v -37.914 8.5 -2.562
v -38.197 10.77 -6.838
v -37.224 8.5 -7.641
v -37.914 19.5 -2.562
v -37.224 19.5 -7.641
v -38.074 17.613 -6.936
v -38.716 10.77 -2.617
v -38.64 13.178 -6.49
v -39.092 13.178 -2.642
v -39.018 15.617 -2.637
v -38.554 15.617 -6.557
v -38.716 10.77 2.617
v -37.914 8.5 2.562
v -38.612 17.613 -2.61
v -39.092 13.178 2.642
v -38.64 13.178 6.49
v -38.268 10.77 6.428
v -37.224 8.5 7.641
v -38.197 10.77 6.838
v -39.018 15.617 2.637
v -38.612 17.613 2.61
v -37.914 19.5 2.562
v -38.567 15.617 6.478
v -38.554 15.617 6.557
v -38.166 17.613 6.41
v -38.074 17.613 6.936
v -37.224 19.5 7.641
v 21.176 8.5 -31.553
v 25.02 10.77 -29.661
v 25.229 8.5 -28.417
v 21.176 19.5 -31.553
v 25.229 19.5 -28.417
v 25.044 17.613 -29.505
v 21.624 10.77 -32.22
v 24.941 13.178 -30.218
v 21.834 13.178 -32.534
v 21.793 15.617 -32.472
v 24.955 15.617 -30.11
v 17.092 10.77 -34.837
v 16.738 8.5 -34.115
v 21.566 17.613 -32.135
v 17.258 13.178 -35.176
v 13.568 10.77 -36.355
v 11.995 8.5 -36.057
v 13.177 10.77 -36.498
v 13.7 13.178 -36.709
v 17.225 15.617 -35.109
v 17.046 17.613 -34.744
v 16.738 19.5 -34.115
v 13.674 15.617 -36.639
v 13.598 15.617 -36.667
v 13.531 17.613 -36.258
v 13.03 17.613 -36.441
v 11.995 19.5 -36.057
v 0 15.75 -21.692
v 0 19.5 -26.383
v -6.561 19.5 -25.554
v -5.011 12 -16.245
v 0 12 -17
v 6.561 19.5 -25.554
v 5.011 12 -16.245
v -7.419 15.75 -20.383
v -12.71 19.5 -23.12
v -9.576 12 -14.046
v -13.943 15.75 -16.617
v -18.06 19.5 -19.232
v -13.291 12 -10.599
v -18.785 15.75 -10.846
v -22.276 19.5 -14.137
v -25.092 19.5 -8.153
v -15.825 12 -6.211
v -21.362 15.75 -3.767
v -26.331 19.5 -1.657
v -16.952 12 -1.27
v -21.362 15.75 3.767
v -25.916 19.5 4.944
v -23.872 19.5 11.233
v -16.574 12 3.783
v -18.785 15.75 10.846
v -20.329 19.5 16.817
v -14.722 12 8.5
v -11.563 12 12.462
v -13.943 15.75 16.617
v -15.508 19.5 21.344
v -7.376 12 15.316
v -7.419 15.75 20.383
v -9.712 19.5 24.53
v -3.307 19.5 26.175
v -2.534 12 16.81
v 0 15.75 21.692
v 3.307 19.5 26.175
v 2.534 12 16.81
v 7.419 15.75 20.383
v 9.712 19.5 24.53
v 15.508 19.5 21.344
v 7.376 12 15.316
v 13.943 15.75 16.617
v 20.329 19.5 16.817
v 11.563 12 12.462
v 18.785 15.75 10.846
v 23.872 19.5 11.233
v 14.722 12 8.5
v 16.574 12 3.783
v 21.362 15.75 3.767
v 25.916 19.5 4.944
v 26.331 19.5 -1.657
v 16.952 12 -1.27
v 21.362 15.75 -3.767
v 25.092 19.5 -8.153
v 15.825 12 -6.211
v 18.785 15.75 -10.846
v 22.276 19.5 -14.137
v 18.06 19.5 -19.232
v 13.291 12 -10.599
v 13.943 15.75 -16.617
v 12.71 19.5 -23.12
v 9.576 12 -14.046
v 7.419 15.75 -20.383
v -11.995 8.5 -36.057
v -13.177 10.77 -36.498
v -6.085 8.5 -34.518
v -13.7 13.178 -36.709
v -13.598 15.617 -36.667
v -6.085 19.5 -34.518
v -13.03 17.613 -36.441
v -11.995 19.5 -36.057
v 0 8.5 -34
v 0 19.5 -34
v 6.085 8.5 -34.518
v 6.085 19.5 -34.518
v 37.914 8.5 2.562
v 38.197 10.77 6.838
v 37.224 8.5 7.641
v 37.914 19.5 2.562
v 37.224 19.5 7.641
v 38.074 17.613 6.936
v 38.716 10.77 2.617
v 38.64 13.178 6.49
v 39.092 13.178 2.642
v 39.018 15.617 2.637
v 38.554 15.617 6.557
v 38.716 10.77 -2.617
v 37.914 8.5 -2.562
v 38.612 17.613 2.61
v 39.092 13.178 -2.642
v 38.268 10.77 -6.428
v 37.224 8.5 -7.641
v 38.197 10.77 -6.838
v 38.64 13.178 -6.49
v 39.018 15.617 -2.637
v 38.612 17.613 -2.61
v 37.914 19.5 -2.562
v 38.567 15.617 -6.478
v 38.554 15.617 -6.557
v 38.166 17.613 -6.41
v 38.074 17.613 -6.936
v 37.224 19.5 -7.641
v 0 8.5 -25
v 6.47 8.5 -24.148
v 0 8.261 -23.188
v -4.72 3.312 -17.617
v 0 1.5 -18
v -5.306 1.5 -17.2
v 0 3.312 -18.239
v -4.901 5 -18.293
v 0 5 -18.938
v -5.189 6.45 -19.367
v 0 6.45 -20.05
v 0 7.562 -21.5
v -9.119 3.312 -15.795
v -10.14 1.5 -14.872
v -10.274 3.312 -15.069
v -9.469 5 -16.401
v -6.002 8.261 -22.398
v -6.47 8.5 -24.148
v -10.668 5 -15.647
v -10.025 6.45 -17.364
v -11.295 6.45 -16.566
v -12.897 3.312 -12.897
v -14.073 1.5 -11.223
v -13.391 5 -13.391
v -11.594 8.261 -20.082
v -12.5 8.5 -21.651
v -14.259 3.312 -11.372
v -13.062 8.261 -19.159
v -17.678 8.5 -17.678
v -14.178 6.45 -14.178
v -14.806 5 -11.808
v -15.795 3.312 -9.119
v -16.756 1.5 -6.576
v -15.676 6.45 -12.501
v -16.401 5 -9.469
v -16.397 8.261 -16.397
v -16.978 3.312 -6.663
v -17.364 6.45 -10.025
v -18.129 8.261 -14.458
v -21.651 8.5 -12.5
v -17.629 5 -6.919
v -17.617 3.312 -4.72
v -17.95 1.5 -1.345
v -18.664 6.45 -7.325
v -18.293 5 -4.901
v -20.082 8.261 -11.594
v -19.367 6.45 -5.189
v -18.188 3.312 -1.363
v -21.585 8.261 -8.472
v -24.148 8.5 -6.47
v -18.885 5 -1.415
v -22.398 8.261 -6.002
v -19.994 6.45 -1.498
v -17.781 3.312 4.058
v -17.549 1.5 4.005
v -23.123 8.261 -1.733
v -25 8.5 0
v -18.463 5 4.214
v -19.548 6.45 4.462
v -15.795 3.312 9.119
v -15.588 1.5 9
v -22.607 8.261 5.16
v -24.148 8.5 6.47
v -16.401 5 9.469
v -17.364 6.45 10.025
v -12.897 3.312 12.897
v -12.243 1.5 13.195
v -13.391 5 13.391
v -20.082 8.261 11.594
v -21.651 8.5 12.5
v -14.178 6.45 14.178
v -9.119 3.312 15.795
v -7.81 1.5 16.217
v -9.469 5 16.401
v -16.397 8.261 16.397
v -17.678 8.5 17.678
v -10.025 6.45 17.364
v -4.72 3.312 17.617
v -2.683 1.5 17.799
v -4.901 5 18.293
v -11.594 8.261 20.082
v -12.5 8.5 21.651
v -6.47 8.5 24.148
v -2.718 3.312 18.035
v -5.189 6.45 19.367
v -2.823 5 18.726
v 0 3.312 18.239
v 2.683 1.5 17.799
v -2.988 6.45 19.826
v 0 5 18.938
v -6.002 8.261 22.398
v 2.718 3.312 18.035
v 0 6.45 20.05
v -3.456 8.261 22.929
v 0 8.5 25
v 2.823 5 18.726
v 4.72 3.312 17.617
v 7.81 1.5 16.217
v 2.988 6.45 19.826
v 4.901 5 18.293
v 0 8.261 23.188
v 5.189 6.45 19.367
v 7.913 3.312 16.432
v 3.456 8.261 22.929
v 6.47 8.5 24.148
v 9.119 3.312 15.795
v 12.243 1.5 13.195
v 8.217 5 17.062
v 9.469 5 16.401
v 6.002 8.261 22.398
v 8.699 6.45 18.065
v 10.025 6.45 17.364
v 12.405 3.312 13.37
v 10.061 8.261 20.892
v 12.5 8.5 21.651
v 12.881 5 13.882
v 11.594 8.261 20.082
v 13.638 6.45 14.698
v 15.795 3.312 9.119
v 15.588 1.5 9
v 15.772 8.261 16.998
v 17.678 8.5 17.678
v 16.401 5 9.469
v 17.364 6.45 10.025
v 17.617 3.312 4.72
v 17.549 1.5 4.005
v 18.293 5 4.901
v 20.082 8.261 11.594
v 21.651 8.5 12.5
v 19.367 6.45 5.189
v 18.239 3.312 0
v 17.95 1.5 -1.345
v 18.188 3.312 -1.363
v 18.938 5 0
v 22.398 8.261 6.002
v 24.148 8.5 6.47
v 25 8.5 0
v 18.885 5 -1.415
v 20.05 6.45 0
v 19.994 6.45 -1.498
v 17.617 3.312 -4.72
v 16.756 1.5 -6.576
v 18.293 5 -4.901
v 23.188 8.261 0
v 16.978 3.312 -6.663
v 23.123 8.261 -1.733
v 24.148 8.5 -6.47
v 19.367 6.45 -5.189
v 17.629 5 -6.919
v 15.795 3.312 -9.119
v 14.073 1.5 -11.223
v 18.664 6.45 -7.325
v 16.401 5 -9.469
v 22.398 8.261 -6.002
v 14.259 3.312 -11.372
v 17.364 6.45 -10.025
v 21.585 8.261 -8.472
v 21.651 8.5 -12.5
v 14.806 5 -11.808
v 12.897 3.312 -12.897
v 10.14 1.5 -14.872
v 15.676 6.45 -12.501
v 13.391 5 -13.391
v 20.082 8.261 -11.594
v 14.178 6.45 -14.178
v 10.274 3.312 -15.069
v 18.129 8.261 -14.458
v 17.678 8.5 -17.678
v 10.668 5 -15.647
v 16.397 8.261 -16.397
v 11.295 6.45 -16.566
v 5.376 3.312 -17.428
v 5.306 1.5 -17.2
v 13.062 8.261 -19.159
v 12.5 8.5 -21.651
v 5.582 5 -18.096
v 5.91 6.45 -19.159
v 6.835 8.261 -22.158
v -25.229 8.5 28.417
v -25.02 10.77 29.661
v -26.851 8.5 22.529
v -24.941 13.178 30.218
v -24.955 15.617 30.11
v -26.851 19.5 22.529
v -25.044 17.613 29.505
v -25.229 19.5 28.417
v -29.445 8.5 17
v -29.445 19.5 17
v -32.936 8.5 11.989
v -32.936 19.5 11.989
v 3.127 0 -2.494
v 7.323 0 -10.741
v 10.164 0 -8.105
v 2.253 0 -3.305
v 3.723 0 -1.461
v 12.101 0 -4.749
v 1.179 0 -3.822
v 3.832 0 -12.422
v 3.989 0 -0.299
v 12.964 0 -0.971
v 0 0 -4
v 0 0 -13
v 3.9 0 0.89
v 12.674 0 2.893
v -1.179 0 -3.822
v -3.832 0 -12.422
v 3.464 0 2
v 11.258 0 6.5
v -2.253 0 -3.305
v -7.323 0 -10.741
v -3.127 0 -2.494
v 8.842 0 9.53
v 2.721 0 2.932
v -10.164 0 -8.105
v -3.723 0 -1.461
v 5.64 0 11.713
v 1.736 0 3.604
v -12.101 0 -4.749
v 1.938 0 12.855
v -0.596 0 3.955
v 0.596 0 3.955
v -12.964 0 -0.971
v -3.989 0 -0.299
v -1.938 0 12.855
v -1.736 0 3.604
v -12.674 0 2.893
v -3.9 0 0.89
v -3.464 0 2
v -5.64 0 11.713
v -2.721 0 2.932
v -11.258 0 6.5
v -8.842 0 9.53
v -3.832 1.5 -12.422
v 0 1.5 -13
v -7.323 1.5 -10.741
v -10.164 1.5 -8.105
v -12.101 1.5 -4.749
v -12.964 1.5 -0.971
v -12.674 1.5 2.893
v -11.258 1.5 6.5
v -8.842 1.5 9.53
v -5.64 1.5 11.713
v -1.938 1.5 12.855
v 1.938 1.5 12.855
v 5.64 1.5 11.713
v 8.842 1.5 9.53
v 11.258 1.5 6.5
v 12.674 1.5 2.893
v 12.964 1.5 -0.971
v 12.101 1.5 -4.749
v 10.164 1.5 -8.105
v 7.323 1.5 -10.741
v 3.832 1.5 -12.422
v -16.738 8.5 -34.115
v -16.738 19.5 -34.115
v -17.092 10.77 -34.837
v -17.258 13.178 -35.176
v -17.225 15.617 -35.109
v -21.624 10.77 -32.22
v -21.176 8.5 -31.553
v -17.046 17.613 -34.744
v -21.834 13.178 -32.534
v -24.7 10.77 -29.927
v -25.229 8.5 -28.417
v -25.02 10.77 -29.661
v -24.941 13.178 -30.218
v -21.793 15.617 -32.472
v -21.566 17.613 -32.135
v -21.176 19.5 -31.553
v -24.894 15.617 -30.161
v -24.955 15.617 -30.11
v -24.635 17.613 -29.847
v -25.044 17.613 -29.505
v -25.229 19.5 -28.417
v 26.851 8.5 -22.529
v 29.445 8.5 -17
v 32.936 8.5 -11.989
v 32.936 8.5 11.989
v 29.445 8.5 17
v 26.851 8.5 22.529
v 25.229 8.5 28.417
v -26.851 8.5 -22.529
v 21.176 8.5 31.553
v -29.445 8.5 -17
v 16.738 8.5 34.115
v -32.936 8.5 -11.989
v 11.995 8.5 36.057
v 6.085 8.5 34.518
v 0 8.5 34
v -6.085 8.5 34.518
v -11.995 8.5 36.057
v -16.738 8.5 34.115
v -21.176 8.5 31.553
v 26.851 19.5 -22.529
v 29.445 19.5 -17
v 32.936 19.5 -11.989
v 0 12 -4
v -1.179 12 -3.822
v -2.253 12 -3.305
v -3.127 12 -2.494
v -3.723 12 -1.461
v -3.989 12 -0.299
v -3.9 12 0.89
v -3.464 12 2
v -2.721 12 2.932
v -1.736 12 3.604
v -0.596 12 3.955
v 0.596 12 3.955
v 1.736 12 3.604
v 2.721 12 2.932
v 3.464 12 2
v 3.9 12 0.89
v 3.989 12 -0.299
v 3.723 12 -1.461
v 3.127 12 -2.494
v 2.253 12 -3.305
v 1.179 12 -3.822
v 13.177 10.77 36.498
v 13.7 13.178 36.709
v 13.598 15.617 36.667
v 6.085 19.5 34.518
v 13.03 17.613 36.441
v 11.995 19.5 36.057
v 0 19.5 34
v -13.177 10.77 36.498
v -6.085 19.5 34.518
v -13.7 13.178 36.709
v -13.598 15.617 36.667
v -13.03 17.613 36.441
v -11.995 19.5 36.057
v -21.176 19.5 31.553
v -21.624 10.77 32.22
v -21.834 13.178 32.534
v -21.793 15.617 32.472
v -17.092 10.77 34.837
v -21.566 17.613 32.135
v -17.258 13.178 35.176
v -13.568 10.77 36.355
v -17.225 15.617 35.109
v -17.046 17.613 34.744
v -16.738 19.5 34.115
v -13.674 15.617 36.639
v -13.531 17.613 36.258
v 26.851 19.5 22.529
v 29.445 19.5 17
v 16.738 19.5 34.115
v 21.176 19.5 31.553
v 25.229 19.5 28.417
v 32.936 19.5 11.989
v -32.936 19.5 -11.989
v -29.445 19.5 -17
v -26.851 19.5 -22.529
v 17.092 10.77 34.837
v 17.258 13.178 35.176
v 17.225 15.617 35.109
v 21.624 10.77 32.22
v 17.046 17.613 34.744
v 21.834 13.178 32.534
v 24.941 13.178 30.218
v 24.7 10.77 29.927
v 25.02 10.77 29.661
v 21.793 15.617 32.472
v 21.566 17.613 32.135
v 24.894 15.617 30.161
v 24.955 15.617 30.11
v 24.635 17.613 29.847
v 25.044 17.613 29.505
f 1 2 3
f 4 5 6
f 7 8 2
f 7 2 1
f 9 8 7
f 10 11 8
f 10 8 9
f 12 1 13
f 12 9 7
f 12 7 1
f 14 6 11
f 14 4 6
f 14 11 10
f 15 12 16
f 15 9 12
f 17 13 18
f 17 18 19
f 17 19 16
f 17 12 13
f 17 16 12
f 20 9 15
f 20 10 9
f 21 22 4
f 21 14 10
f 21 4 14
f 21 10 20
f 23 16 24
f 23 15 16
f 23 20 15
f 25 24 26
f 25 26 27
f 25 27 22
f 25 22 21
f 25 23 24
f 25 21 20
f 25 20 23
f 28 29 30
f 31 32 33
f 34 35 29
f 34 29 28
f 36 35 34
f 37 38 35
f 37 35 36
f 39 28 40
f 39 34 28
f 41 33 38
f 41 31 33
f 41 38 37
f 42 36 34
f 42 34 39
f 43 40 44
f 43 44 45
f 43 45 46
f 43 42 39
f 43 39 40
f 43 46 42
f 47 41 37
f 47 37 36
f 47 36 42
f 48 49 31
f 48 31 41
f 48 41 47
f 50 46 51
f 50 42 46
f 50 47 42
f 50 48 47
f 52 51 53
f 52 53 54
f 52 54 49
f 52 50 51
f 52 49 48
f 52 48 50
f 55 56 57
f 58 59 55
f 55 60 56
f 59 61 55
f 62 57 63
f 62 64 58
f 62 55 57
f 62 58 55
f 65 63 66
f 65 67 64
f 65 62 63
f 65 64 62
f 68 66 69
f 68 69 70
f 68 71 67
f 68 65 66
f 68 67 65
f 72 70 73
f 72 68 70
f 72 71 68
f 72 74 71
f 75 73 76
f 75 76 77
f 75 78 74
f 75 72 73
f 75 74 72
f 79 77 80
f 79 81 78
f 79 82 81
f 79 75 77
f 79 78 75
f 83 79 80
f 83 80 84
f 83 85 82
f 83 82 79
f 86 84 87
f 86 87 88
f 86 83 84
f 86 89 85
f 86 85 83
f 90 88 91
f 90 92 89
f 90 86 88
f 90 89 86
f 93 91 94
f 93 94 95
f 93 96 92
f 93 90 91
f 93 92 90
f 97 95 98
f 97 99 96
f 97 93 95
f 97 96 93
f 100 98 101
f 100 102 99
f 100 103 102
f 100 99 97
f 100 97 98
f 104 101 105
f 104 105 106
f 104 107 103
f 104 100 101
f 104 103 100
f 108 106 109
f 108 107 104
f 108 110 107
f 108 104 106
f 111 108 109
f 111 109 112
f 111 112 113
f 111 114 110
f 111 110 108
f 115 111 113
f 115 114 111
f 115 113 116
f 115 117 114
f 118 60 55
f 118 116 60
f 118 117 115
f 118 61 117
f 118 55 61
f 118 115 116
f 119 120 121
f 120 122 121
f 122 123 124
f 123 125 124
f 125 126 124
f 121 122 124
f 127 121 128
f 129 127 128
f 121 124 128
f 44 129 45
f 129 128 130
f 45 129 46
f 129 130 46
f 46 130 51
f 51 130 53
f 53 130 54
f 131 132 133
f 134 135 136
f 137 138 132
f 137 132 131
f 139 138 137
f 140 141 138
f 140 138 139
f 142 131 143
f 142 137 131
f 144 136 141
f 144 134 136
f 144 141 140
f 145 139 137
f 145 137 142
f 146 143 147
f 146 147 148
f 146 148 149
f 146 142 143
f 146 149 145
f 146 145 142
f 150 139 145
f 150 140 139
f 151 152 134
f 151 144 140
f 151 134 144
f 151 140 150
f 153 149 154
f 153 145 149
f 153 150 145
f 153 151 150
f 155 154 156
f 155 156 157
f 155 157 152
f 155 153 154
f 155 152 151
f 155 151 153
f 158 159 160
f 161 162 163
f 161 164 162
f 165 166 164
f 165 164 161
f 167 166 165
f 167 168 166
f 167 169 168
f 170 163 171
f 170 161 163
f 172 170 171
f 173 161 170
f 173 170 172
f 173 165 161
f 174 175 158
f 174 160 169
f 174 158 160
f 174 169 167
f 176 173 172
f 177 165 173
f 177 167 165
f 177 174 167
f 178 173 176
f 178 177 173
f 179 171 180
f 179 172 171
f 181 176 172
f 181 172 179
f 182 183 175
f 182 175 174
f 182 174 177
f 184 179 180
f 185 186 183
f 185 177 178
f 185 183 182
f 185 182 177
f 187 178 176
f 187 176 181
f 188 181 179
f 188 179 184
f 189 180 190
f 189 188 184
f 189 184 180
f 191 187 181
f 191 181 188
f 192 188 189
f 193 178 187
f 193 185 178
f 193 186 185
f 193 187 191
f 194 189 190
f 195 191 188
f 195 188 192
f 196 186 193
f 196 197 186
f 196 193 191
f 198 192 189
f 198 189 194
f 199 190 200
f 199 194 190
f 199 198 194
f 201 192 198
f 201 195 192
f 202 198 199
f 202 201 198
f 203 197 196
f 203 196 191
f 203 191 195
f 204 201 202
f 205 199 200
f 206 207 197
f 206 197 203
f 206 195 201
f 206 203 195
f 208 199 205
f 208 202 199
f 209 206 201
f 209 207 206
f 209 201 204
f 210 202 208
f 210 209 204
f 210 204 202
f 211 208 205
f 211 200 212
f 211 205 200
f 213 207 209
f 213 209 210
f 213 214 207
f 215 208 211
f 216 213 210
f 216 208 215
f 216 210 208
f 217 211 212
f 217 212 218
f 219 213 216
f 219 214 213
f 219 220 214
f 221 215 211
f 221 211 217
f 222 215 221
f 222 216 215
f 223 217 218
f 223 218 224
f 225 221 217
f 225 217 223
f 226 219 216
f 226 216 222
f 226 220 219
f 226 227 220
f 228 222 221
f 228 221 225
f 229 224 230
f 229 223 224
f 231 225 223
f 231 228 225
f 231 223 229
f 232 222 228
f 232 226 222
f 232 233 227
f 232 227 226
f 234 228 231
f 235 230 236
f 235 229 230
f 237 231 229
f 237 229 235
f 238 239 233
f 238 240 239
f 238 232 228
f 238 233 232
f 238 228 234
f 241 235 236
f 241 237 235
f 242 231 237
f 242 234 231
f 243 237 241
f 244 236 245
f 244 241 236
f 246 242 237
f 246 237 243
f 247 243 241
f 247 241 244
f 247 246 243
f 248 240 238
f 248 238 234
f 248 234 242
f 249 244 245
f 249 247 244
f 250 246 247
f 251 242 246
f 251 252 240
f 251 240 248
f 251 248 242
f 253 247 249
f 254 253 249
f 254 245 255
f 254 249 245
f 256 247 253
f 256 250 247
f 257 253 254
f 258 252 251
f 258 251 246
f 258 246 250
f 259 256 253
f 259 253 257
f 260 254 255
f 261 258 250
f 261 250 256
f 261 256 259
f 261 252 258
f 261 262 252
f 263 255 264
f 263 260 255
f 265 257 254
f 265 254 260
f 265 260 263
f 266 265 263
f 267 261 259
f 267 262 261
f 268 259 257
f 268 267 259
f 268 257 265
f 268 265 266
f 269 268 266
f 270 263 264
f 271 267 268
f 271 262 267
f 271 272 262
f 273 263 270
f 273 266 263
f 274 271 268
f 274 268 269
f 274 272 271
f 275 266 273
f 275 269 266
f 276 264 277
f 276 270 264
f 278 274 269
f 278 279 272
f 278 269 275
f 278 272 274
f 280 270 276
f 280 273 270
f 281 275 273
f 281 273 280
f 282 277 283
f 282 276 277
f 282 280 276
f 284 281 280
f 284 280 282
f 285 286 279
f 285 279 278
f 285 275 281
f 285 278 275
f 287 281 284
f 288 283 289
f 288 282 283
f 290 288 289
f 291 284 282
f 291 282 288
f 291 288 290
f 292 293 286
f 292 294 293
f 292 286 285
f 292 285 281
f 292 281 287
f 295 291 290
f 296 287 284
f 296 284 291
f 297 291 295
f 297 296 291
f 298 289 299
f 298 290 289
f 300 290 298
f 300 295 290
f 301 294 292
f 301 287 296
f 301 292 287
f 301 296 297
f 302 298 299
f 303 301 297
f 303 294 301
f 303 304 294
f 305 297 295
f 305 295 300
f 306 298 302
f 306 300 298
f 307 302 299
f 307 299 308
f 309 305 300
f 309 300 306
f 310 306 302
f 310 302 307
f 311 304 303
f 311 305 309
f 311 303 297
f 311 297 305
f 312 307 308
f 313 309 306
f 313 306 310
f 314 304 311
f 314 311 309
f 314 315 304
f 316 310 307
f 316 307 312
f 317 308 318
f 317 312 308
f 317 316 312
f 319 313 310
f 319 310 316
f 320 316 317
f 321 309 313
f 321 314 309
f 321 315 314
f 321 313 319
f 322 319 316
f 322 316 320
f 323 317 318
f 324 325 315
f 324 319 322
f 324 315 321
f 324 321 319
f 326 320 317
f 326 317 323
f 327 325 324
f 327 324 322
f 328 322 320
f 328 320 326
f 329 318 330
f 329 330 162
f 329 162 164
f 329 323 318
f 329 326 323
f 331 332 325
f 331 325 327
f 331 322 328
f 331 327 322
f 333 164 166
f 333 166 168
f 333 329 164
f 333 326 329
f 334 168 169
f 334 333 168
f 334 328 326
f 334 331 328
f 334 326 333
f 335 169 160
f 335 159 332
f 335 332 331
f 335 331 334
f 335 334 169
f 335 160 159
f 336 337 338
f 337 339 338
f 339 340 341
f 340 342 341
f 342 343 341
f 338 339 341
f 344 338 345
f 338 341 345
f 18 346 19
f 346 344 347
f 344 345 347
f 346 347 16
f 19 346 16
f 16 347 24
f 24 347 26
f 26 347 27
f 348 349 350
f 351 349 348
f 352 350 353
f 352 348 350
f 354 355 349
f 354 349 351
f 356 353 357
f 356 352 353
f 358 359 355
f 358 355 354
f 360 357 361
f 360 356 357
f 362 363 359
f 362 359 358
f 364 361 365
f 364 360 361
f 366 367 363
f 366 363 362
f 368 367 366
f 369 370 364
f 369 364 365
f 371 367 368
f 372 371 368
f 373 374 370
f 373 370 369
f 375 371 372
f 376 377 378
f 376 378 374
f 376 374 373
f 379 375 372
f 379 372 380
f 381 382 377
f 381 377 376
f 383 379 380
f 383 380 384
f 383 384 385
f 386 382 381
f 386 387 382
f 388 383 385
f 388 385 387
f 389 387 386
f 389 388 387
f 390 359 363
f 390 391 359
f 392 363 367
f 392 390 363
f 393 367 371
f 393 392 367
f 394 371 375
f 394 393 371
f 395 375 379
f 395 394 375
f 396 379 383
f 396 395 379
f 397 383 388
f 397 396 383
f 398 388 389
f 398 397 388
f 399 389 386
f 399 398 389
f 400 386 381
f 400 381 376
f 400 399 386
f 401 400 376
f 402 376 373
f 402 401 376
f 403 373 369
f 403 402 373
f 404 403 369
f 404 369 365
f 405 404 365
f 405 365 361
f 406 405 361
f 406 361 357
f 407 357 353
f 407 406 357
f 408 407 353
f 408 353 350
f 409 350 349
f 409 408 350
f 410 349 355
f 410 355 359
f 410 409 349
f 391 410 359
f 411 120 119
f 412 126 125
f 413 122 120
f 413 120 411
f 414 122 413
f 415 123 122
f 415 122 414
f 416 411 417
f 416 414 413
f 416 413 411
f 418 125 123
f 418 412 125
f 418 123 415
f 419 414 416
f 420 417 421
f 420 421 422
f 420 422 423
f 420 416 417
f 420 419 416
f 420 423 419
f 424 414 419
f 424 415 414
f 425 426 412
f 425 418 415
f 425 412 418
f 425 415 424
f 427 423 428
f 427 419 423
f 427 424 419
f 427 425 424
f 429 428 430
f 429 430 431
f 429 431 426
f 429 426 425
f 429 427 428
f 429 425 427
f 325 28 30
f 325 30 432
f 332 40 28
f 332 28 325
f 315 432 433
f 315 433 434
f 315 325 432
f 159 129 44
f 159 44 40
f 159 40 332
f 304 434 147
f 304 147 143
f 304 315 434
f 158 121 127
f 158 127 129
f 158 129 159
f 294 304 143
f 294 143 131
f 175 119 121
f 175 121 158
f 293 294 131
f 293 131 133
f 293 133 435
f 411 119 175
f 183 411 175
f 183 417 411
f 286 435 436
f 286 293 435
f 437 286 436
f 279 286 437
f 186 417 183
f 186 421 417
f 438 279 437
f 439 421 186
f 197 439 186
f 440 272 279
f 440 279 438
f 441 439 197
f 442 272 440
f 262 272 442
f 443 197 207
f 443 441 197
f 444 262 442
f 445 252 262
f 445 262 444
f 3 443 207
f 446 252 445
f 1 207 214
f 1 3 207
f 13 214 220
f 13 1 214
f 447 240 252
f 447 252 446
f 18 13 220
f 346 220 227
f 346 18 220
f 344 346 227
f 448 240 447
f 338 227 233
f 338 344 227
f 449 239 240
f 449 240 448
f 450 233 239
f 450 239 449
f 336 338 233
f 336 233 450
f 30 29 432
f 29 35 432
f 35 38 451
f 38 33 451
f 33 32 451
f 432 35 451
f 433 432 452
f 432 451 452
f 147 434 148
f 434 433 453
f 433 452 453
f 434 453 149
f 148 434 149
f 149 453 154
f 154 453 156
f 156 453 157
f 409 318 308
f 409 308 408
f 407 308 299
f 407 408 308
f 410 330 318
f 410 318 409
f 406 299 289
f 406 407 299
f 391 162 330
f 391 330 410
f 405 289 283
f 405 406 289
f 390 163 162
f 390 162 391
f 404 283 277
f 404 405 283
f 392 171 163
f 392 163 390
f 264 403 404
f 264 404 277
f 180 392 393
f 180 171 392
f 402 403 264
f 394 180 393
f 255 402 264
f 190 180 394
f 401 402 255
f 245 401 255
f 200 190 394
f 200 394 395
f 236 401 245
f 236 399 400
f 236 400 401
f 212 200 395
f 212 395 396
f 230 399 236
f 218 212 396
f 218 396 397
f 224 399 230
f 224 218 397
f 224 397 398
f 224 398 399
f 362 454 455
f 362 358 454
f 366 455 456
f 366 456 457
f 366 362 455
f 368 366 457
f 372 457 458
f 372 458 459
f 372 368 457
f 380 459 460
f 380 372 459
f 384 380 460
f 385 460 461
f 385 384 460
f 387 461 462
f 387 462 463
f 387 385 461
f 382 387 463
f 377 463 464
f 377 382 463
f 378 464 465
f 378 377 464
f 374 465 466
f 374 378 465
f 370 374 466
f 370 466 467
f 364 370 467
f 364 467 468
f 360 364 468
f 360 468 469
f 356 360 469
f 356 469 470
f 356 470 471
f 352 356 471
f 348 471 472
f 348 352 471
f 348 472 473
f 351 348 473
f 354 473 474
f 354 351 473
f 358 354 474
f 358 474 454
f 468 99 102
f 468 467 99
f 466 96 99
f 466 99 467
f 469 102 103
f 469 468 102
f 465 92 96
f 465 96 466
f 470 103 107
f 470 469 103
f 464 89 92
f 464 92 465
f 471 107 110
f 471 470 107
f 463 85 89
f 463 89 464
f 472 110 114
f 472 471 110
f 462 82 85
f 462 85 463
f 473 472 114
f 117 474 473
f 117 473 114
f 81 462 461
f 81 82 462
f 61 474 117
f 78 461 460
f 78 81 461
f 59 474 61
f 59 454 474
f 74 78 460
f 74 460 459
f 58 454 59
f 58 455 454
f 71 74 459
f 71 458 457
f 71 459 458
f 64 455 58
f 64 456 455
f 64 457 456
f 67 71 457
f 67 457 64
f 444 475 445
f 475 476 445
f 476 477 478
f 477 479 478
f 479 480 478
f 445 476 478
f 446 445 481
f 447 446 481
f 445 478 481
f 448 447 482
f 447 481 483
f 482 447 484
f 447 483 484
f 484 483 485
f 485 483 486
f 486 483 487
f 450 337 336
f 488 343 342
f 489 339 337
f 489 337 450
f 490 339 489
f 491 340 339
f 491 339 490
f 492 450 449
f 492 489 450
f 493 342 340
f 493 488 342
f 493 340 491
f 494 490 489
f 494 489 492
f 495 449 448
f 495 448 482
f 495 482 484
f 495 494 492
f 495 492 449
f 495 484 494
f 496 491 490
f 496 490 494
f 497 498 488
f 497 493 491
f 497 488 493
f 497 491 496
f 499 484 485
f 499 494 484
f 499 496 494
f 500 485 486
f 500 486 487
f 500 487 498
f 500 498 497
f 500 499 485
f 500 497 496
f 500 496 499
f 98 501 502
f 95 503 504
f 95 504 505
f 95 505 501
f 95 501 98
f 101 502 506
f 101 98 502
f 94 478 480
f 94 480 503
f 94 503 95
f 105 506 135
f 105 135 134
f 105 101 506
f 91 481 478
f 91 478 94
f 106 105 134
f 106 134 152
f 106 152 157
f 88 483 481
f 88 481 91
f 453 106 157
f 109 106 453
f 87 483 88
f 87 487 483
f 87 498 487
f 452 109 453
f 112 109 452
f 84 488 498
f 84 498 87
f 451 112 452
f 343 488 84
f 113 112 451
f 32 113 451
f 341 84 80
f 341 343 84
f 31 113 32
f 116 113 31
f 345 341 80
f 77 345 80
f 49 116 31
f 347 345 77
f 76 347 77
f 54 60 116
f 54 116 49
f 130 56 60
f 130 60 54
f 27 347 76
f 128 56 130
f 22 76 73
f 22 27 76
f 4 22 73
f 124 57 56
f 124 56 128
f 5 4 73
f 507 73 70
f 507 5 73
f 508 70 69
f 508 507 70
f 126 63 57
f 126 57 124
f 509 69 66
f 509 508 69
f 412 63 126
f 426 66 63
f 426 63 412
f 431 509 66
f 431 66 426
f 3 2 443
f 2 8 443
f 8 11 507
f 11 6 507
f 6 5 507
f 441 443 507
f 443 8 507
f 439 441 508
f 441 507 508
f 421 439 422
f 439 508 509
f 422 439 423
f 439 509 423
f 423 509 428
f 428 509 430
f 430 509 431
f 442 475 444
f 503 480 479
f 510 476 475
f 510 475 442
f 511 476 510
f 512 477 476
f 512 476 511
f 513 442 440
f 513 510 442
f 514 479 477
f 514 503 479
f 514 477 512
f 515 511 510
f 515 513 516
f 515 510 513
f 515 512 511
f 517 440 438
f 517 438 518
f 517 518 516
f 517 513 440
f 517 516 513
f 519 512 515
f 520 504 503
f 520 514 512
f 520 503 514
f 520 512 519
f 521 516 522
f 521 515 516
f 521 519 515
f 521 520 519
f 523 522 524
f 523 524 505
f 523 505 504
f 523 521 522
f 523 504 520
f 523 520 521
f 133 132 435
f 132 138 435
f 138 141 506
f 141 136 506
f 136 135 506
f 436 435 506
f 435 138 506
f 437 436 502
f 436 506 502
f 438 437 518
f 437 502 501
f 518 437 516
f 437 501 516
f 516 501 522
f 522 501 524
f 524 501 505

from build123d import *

# Parameters (mm, degrees)
ENL_V_MAT_EXTRU_1_DEPTH      = 59.776504379
R_P_TITION_CIRCULAIRE1_COUNT = 6


with BuildPart() as part:
    # Esquisse1 → Révolution1 (revolve)
    with BuildSketch(Plane.XY):
        with BuildLine():
            Line((-4, 12), (-4, 0))
            Line((-4, 0), (-13, 0))
            Line((-13, 0), (-13, 1.5))
            Line((-13, 1.5), (-18, 1.5))
            ThreePointArc((-18, 1.5), (-20.050252532, 6.449747468), (-25, 8.5))
            Line((-25, 8.5), (-38, 8.5))
            ThreePointArc((-38, 8.5), (-39.207317246, 14), (-38, 19.5))
            Line((-38, 19.5), (-26.383086274, 19.5))
            Line((-26.383086274, 19.5), (-17, 12))
            Line((-17, 12), (-4, 12))
        make_face()
    revolve(axis=Axis((0, 0, 0), (0, 1, 0)))

    # Esquisse2 → Enlèv. mat.-Extru.1 (cut, through all)
    with BuildSketch(Plane(origin=(0, 19.5, 0), x_dir=(1, 0, 0), z_dir=(0, 1, 0))):
        with BuildLine():
            Line((-18.717027808, -39.248205418), (0, -70))
            Line((0, -70), (18.717027808, -39.248205418))
            ThreePointArc((18.717027808, -39.248205418), (0, -34), (-18.717027808, -39.248205418))
        make_face()
    enl_v_mat_extru_1 = extrude(amount=-ENL_V_MAT_EXTRU_1_DEPTH, mode=Mode.SUBTRACT)

    # Répétition circulaire1: Enlèv. mat.-Extru.1 ×6 about axis
    r_p_tition_circulaire1_axis = Axis((0, 0, 0), (0, 1, 0))
    for i in range(1, R_P_TITION_CIRCULAIRE1_COUNT):
        add(enl_v_mat_extru_1.rotate(r_p_tition_circulaire1_axis, i * 360 / R_P_TITION_CIRCULAIRE1_COUNT), mode=Mode.SUBTRACT)


solid = part.part
